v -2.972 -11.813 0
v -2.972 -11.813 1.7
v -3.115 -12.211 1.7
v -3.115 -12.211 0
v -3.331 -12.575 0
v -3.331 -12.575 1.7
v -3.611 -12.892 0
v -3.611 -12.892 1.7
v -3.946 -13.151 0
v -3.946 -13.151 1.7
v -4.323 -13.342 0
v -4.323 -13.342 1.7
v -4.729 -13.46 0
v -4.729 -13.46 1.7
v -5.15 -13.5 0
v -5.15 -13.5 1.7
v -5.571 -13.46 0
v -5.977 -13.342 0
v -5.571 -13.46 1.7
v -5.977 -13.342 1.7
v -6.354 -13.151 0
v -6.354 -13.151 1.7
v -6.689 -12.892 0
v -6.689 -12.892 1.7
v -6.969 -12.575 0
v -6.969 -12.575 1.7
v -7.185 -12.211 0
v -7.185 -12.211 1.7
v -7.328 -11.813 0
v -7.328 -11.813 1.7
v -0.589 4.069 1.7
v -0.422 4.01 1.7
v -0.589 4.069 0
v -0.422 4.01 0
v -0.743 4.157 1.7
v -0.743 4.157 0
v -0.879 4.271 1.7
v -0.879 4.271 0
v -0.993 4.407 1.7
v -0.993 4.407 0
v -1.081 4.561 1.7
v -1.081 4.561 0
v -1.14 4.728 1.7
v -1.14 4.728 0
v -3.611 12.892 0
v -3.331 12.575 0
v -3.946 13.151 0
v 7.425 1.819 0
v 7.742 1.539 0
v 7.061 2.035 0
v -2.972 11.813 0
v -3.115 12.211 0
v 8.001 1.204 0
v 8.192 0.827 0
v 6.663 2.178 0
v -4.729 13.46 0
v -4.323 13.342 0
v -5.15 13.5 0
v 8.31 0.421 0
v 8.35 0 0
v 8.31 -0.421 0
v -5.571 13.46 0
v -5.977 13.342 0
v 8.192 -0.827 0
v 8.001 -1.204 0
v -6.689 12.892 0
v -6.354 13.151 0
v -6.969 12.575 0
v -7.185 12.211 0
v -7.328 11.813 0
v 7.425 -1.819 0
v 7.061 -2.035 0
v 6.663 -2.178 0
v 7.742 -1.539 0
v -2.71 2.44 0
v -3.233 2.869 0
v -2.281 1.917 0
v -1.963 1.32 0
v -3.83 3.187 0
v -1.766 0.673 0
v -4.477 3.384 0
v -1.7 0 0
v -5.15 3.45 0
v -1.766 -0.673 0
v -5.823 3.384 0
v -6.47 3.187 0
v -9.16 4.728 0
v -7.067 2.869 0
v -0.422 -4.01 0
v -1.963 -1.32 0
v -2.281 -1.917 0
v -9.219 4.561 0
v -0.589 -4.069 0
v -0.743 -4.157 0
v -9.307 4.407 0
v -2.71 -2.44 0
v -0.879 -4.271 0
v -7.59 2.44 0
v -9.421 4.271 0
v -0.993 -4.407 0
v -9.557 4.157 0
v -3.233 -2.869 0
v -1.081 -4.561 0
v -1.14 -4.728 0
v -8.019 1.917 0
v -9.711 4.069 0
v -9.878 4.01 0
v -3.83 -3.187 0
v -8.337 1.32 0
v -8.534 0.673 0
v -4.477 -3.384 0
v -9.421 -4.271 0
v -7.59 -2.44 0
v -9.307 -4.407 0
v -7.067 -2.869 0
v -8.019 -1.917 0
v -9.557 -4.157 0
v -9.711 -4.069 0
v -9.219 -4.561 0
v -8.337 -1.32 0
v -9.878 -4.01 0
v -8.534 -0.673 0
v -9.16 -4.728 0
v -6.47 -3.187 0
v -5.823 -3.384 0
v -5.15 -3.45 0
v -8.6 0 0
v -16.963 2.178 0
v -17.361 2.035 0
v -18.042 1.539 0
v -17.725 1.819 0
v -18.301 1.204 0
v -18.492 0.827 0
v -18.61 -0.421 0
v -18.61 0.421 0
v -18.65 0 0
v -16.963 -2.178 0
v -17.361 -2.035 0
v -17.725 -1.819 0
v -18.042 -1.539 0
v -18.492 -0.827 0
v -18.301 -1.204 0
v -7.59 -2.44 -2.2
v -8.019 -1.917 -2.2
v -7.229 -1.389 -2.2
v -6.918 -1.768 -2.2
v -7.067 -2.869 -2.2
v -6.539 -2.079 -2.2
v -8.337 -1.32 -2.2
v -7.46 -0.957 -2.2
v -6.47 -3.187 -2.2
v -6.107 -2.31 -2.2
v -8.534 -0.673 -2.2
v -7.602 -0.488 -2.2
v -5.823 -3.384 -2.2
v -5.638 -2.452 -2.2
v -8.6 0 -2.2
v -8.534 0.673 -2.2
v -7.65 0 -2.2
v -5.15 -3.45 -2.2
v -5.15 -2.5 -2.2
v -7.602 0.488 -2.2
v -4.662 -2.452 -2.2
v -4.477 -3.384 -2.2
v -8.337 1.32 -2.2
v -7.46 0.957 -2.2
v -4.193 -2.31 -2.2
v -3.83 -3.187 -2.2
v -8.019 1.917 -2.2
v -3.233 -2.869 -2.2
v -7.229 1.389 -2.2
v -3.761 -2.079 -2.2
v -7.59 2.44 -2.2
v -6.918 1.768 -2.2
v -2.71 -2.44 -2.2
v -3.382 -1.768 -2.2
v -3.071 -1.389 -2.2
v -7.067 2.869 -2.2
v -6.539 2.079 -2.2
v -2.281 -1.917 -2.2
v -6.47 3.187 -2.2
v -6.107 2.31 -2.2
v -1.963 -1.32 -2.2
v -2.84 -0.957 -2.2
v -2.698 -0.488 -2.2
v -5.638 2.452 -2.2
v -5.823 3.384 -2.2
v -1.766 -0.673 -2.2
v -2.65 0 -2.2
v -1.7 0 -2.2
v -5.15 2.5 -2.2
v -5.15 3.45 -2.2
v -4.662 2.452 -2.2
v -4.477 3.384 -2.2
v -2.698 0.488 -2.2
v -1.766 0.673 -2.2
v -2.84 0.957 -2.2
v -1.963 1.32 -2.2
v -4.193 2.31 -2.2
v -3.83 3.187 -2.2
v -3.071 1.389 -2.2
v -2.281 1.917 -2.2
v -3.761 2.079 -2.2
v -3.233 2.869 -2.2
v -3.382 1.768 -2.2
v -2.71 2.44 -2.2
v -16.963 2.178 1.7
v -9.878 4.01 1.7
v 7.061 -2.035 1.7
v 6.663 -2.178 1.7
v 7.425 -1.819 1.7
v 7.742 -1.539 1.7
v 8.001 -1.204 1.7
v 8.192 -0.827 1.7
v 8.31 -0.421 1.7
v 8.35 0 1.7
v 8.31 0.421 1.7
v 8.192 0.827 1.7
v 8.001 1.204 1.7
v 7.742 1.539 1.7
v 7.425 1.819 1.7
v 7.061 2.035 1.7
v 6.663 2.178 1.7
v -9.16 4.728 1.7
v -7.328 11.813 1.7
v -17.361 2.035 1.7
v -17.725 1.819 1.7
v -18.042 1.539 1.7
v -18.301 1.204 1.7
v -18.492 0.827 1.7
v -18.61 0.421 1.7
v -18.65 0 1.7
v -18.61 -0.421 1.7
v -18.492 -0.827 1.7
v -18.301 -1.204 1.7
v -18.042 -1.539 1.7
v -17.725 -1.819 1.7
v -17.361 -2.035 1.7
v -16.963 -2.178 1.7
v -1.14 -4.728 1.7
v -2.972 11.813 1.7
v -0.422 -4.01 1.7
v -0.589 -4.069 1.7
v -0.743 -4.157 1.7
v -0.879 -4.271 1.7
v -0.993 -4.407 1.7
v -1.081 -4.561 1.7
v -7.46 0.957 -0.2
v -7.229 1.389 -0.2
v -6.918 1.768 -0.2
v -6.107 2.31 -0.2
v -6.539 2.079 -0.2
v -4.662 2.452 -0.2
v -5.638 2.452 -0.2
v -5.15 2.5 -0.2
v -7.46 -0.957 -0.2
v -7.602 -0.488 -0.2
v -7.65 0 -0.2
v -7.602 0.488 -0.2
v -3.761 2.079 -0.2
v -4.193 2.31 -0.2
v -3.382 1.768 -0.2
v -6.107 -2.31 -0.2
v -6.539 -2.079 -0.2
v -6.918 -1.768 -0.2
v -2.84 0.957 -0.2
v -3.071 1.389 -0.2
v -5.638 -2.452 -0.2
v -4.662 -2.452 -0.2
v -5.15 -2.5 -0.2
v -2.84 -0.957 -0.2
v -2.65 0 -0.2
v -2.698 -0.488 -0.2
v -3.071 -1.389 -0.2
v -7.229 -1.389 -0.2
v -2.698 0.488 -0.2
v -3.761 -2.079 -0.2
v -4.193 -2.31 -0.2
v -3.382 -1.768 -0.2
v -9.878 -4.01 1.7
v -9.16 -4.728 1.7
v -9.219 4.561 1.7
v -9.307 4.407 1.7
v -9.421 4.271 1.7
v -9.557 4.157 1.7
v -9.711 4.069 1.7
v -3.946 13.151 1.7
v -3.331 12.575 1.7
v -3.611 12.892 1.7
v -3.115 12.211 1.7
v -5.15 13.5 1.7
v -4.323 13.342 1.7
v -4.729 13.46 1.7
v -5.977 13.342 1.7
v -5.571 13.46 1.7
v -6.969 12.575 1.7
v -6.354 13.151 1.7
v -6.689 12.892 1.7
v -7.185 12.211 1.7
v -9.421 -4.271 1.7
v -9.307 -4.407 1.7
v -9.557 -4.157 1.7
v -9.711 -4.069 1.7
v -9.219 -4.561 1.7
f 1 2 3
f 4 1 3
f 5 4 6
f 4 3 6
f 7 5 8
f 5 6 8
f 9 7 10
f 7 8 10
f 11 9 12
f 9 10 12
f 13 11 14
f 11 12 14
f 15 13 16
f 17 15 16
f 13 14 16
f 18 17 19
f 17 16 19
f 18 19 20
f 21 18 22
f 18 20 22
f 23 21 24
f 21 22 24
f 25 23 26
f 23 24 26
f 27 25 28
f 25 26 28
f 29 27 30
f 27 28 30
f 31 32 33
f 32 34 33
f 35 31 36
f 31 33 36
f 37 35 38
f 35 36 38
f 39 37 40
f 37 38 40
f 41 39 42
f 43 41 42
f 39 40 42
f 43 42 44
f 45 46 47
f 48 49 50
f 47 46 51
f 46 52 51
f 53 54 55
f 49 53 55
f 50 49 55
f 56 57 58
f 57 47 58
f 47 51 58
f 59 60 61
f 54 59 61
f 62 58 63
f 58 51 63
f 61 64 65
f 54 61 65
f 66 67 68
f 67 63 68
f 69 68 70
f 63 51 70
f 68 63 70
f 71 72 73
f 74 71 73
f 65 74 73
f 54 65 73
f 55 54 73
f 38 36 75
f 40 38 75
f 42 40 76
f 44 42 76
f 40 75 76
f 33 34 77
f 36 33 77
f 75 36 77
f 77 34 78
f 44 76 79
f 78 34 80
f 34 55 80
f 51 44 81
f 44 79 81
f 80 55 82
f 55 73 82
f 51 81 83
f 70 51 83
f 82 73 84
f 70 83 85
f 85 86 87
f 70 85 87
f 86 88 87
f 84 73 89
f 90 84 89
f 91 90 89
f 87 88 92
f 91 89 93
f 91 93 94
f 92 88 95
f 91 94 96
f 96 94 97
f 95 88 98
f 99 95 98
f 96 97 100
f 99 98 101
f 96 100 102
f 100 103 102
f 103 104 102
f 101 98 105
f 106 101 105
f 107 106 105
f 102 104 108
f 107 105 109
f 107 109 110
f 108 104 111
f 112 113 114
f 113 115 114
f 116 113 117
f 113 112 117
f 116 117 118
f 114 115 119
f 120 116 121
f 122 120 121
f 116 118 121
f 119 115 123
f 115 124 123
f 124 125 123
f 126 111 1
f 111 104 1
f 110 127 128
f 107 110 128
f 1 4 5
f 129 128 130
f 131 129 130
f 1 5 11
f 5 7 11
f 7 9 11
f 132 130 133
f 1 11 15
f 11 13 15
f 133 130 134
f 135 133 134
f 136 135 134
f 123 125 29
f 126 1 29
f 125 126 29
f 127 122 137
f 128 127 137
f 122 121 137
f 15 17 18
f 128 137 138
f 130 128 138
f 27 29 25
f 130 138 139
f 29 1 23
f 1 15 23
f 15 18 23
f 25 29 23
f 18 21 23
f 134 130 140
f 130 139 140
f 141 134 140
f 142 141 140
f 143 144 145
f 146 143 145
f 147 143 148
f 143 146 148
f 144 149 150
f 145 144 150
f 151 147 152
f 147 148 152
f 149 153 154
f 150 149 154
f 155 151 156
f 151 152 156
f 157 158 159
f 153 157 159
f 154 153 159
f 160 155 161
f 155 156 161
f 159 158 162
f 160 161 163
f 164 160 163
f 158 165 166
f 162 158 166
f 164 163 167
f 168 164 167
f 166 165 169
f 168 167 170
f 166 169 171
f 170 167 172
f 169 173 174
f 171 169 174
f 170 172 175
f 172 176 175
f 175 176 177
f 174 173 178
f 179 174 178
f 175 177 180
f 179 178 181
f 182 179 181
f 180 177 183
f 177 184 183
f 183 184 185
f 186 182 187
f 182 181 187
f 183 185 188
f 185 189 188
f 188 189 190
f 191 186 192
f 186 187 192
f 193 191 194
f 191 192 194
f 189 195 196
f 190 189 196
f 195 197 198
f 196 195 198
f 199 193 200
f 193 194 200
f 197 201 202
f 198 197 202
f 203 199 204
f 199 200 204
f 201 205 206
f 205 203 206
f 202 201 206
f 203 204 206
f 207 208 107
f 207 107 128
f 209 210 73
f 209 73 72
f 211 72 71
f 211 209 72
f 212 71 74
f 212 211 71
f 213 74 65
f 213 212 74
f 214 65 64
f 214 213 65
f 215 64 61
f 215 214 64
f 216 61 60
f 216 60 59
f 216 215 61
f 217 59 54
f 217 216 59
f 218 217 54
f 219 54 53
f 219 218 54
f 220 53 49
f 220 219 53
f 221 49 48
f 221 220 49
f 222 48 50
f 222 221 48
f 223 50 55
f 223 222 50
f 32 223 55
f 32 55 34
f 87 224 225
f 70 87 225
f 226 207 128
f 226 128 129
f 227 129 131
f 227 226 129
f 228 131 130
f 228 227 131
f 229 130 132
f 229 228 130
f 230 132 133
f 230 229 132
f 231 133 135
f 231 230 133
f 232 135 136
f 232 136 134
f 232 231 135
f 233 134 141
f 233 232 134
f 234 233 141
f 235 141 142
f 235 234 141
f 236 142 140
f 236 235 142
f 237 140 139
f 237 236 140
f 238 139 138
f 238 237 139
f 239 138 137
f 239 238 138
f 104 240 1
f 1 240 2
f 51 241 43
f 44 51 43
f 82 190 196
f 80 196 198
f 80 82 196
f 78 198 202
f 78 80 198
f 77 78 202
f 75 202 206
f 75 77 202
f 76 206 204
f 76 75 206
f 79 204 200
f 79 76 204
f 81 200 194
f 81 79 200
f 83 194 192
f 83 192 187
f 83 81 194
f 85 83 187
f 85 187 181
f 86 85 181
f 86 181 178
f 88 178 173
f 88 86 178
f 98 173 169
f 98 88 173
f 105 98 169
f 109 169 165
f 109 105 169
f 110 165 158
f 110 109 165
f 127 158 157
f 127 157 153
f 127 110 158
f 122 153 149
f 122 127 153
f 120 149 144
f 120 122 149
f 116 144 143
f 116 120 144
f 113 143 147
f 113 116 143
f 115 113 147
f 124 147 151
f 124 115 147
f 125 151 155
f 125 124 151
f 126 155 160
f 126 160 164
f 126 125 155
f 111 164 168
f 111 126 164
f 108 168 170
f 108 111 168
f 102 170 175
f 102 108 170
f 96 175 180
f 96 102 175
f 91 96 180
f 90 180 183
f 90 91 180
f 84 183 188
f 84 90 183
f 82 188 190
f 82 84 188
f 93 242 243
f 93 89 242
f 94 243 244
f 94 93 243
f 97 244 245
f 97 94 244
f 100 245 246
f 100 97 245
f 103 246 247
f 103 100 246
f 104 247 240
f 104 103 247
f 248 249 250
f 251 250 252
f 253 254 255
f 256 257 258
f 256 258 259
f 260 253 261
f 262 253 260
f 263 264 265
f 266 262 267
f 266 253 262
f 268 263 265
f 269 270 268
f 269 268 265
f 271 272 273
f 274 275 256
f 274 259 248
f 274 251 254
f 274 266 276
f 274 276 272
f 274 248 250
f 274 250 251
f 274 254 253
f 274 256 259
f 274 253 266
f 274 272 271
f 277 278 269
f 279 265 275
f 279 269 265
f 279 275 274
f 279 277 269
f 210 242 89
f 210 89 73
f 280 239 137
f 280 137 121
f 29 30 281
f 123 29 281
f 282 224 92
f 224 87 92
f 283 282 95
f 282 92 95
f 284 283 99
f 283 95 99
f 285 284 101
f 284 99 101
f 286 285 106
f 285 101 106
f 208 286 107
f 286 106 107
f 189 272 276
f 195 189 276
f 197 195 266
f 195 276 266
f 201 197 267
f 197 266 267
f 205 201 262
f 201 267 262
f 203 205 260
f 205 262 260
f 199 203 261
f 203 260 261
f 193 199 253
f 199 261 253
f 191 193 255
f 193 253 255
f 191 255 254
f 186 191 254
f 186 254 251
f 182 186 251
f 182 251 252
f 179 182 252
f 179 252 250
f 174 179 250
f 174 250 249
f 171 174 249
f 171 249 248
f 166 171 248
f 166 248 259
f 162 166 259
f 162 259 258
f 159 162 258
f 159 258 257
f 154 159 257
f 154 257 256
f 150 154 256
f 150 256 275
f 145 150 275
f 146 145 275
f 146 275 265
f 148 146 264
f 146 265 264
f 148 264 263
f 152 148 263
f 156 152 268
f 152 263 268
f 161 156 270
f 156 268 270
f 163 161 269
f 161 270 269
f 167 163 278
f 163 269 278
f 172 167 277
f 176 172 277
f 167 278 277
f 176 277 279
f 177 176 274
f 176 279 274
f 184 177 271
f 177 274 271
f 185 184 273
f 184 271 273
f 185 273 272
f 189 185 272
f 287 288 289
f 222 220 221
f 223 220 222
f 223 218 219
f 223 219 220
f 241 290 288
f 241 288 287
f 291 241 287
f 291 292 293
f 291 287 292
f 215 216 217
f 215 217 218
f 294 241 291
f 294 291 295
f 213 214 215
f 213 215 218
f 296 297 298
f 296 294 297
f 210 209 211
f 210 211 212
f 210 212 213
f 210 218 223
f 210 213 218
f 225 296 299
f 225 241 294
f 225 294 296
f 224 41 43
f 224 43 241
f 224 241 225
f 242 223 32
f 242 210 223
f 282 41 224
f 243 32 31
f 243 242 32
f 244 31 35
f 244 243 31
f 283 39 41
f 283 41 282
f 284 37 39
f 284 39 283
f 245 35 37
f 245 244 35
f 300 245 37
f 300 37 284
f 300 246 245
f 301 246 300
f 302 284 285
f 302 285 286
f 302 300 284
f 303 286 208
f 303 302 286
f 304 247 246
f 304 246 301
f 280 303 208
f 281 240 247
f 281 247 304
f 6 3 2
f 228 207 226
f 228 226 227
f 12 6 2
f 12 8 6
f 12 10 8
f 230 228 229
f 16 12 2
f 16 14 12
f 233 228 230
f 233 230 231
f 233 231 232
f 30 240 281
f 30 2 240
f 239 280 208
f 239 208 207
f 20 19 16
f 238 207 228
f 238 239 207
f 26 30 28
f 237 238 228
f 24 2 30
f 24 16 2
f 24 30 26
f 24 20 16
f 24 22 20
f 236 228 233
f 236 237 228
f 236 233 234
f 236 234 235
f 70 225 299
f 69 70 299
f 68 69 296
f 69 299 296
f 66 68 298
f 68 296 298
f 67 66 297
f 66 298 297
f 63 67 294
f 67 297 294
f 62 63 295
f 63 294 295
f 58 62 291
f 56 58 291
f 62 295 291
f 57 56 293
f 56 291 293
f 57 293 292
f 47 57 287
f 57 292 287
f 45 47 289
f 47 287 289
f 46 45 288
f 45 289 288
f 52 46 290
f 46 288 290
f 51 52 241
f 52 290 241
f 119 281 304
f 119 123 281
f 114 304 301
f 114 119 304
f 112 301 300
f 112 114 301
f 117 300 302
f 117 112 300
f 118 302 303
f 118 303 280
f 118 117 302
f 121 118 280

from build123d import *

# Parameters (mm, degrees)
SKETCH1_R              = 3.45
SKETCH1_R_2            = 2.5
BOSS_EXTRUDE1_DEPTH    = 2.2
BOSS_EXTRUDE4_START    = 1.7
SKETCH1_9_R            = 3.45
SKETCH1_9_R_2          = 2.5
BOSS_EXTRUDE4_DEPTH    = 1.7
BOSS_EXTRUDE5_START    = 1.7
BOSS_EXTRUDE5_DEPTH    = 1.7
MIRROR3_START          = 1.7
MIRROR3_COPY_1_DEPTH   = 1.7
FILLET1_R              = 1
SKETCH2_R              = 2.5
F_0ZVARIANCEBOSS_DEPTH = 0.2


with BuildPart() as part:
    # Sketch1 → Boss-Extrude1 (new body)
    with BuildSketch(Plane.XY):
        with Locations((-5.15, 0)):
            Circle(SKETCH1_R)
        with Locations((-5.15, 0)):
            Circle(SKETCH1_R_2, mode=Mode.SUBTRACT)
    extrude(amount=-BOSS_EXTRUDE1_DEPTH)

    # Sketch1<9> → Boss-Extrude4 (add)
    # profile 1 of 2: a face of its own
    with BuildSketch(Plane.XY.offset(BOSS_EXTRUDE4_START)):
        with Locations((-5.15, 0)):
            Circle(SKETCH1_9_R)
        with Locations((-5.15, 0)):
            Circle(SKETCH1_9_R_2, mode=Mode.SUBTRACT)
    # profile 2 of 2: a face of its own
    with BuildSketch(Plane.XY.offset(BOSS_EXTRUDE4_START)):
        with Locations((-5.15, 0)):
            Circle(SKETCH1_9_R_2)
    extrude(amount=-BOSS_EXTRUDE4_DEPTH)

    # Sketch1<10> → Boss-Extrude5 (add)
    with BuildSketch(Plane.XY.offset(BOSS_EXTRUDE5_START)):
        with BuildLine():
            Line((-7.589518395, 2.439518395), (-8.6, 3.45))
            Line((-8.6, 3.45), (-9.307106781, 4.157106781))
            Line((-9.307106781, 4.157106781), (-16.963017409, 2.178419472))
            ThreePointArc((-16.963017409, 2.178419472), (-18.65, 0), (-16.963017409, -2.178419472))
            Line((-16.963017409, -2.178419472), (-9.307106781, -4.157106781))
            Line((-9.307106781, -4.157106781), (-8.6, -3.45))
            Line((-8.6, -3.45), (-7.589518395, -2.439518395))
            ThreePointArc((-7.589518395, -2.439518395), (-8.6, 0), (-7.589518395, 2.439518395))
        make_face()
    boss_extrude5 = extrude(amount=-BOSS_EXTRUDE5_DEPTH)

    # Mirror2: Boss-Extrude5 across plane
    add(boss_extrude5.mirror(Plane(origin=(-2.575, 2.575, 0), x_dir=(0, 0, 1), z_dir=(0.7071067811865476, -0.7071067811865475, 0))))

    # Mirror3: Boss-Extrude5 across plane
    add(boss_extrude5.mirror(Plane(origin=(-2.575, -2.575, 0), x_dir=(0, 0, 1), z_dir=(0.7071067811865476, 0.7071067811865475, 0))))

    # Mirror3 copy 1 sketch → Mirror3 copy 1 (add)
    with BuildSketch(Plane(origin=(-10.3, 0, 0), x_dir=(-1, 0, 0), z_dir=(0, 0, 1)).offset(MIRROR3_START)):
        with BuildLine():
            Line((-7.589518395, 2.439518395), (-8.6, 3.45))
            Line((-8.6, 3.45), (-9.307106781, 4.157106781))
            Line((-9.307106781, 4.157106781), (-16.963017409, 2.178419472))
            ThreePointArc((-16.963017409, 2.178419472), (-18.65, 0), (-16.963017409, -2.178419472))
            Line((-16.963017409, -2.178419472), (-9.307106781, -4.157106781))
            Line((-9.307106781, -4.157106781), (-8.6, -3.45))
            Line((-8.6, -3.45), (-7.589518395, -2.439518395))
            ThreePointArc((-7.589518395, -2.439518395), (-8.6, 0), (-7.589518395, 2.439518395))
        make_face()
    extrude(amount=-MIRROR3_COPY_1_DEPTH)

    # Fillet1
    fillet1_edges = [part.edges().sort_by_distance(p)[0] for p in [
        (-9.307106781, 4.157106781, 0.85),
        (-9.307106781, -4.157106781, 0.85),
        (-0.992893219, -4.157106781, 0.85),
        (-0.992893219, 4.157106781, 0.85),
    ]]
    fillet(fillet1_edges, radius=FILLET1_R)

    # Sketch2 → 0ZvarianceBoss (add)
    with BuildSketch(Plane(origin=(0, 0, 0), x_dir=(-1, 0, 0), z_dir=(0, 0, -1))):
        with Locations(Location((5.15, 0, 0), (0, 0, 180))):
            Circle(SKETCH2_R)
    extrude(amount=F_0ZVARIANCEBOSS_DEPTH)


solid = part.part
